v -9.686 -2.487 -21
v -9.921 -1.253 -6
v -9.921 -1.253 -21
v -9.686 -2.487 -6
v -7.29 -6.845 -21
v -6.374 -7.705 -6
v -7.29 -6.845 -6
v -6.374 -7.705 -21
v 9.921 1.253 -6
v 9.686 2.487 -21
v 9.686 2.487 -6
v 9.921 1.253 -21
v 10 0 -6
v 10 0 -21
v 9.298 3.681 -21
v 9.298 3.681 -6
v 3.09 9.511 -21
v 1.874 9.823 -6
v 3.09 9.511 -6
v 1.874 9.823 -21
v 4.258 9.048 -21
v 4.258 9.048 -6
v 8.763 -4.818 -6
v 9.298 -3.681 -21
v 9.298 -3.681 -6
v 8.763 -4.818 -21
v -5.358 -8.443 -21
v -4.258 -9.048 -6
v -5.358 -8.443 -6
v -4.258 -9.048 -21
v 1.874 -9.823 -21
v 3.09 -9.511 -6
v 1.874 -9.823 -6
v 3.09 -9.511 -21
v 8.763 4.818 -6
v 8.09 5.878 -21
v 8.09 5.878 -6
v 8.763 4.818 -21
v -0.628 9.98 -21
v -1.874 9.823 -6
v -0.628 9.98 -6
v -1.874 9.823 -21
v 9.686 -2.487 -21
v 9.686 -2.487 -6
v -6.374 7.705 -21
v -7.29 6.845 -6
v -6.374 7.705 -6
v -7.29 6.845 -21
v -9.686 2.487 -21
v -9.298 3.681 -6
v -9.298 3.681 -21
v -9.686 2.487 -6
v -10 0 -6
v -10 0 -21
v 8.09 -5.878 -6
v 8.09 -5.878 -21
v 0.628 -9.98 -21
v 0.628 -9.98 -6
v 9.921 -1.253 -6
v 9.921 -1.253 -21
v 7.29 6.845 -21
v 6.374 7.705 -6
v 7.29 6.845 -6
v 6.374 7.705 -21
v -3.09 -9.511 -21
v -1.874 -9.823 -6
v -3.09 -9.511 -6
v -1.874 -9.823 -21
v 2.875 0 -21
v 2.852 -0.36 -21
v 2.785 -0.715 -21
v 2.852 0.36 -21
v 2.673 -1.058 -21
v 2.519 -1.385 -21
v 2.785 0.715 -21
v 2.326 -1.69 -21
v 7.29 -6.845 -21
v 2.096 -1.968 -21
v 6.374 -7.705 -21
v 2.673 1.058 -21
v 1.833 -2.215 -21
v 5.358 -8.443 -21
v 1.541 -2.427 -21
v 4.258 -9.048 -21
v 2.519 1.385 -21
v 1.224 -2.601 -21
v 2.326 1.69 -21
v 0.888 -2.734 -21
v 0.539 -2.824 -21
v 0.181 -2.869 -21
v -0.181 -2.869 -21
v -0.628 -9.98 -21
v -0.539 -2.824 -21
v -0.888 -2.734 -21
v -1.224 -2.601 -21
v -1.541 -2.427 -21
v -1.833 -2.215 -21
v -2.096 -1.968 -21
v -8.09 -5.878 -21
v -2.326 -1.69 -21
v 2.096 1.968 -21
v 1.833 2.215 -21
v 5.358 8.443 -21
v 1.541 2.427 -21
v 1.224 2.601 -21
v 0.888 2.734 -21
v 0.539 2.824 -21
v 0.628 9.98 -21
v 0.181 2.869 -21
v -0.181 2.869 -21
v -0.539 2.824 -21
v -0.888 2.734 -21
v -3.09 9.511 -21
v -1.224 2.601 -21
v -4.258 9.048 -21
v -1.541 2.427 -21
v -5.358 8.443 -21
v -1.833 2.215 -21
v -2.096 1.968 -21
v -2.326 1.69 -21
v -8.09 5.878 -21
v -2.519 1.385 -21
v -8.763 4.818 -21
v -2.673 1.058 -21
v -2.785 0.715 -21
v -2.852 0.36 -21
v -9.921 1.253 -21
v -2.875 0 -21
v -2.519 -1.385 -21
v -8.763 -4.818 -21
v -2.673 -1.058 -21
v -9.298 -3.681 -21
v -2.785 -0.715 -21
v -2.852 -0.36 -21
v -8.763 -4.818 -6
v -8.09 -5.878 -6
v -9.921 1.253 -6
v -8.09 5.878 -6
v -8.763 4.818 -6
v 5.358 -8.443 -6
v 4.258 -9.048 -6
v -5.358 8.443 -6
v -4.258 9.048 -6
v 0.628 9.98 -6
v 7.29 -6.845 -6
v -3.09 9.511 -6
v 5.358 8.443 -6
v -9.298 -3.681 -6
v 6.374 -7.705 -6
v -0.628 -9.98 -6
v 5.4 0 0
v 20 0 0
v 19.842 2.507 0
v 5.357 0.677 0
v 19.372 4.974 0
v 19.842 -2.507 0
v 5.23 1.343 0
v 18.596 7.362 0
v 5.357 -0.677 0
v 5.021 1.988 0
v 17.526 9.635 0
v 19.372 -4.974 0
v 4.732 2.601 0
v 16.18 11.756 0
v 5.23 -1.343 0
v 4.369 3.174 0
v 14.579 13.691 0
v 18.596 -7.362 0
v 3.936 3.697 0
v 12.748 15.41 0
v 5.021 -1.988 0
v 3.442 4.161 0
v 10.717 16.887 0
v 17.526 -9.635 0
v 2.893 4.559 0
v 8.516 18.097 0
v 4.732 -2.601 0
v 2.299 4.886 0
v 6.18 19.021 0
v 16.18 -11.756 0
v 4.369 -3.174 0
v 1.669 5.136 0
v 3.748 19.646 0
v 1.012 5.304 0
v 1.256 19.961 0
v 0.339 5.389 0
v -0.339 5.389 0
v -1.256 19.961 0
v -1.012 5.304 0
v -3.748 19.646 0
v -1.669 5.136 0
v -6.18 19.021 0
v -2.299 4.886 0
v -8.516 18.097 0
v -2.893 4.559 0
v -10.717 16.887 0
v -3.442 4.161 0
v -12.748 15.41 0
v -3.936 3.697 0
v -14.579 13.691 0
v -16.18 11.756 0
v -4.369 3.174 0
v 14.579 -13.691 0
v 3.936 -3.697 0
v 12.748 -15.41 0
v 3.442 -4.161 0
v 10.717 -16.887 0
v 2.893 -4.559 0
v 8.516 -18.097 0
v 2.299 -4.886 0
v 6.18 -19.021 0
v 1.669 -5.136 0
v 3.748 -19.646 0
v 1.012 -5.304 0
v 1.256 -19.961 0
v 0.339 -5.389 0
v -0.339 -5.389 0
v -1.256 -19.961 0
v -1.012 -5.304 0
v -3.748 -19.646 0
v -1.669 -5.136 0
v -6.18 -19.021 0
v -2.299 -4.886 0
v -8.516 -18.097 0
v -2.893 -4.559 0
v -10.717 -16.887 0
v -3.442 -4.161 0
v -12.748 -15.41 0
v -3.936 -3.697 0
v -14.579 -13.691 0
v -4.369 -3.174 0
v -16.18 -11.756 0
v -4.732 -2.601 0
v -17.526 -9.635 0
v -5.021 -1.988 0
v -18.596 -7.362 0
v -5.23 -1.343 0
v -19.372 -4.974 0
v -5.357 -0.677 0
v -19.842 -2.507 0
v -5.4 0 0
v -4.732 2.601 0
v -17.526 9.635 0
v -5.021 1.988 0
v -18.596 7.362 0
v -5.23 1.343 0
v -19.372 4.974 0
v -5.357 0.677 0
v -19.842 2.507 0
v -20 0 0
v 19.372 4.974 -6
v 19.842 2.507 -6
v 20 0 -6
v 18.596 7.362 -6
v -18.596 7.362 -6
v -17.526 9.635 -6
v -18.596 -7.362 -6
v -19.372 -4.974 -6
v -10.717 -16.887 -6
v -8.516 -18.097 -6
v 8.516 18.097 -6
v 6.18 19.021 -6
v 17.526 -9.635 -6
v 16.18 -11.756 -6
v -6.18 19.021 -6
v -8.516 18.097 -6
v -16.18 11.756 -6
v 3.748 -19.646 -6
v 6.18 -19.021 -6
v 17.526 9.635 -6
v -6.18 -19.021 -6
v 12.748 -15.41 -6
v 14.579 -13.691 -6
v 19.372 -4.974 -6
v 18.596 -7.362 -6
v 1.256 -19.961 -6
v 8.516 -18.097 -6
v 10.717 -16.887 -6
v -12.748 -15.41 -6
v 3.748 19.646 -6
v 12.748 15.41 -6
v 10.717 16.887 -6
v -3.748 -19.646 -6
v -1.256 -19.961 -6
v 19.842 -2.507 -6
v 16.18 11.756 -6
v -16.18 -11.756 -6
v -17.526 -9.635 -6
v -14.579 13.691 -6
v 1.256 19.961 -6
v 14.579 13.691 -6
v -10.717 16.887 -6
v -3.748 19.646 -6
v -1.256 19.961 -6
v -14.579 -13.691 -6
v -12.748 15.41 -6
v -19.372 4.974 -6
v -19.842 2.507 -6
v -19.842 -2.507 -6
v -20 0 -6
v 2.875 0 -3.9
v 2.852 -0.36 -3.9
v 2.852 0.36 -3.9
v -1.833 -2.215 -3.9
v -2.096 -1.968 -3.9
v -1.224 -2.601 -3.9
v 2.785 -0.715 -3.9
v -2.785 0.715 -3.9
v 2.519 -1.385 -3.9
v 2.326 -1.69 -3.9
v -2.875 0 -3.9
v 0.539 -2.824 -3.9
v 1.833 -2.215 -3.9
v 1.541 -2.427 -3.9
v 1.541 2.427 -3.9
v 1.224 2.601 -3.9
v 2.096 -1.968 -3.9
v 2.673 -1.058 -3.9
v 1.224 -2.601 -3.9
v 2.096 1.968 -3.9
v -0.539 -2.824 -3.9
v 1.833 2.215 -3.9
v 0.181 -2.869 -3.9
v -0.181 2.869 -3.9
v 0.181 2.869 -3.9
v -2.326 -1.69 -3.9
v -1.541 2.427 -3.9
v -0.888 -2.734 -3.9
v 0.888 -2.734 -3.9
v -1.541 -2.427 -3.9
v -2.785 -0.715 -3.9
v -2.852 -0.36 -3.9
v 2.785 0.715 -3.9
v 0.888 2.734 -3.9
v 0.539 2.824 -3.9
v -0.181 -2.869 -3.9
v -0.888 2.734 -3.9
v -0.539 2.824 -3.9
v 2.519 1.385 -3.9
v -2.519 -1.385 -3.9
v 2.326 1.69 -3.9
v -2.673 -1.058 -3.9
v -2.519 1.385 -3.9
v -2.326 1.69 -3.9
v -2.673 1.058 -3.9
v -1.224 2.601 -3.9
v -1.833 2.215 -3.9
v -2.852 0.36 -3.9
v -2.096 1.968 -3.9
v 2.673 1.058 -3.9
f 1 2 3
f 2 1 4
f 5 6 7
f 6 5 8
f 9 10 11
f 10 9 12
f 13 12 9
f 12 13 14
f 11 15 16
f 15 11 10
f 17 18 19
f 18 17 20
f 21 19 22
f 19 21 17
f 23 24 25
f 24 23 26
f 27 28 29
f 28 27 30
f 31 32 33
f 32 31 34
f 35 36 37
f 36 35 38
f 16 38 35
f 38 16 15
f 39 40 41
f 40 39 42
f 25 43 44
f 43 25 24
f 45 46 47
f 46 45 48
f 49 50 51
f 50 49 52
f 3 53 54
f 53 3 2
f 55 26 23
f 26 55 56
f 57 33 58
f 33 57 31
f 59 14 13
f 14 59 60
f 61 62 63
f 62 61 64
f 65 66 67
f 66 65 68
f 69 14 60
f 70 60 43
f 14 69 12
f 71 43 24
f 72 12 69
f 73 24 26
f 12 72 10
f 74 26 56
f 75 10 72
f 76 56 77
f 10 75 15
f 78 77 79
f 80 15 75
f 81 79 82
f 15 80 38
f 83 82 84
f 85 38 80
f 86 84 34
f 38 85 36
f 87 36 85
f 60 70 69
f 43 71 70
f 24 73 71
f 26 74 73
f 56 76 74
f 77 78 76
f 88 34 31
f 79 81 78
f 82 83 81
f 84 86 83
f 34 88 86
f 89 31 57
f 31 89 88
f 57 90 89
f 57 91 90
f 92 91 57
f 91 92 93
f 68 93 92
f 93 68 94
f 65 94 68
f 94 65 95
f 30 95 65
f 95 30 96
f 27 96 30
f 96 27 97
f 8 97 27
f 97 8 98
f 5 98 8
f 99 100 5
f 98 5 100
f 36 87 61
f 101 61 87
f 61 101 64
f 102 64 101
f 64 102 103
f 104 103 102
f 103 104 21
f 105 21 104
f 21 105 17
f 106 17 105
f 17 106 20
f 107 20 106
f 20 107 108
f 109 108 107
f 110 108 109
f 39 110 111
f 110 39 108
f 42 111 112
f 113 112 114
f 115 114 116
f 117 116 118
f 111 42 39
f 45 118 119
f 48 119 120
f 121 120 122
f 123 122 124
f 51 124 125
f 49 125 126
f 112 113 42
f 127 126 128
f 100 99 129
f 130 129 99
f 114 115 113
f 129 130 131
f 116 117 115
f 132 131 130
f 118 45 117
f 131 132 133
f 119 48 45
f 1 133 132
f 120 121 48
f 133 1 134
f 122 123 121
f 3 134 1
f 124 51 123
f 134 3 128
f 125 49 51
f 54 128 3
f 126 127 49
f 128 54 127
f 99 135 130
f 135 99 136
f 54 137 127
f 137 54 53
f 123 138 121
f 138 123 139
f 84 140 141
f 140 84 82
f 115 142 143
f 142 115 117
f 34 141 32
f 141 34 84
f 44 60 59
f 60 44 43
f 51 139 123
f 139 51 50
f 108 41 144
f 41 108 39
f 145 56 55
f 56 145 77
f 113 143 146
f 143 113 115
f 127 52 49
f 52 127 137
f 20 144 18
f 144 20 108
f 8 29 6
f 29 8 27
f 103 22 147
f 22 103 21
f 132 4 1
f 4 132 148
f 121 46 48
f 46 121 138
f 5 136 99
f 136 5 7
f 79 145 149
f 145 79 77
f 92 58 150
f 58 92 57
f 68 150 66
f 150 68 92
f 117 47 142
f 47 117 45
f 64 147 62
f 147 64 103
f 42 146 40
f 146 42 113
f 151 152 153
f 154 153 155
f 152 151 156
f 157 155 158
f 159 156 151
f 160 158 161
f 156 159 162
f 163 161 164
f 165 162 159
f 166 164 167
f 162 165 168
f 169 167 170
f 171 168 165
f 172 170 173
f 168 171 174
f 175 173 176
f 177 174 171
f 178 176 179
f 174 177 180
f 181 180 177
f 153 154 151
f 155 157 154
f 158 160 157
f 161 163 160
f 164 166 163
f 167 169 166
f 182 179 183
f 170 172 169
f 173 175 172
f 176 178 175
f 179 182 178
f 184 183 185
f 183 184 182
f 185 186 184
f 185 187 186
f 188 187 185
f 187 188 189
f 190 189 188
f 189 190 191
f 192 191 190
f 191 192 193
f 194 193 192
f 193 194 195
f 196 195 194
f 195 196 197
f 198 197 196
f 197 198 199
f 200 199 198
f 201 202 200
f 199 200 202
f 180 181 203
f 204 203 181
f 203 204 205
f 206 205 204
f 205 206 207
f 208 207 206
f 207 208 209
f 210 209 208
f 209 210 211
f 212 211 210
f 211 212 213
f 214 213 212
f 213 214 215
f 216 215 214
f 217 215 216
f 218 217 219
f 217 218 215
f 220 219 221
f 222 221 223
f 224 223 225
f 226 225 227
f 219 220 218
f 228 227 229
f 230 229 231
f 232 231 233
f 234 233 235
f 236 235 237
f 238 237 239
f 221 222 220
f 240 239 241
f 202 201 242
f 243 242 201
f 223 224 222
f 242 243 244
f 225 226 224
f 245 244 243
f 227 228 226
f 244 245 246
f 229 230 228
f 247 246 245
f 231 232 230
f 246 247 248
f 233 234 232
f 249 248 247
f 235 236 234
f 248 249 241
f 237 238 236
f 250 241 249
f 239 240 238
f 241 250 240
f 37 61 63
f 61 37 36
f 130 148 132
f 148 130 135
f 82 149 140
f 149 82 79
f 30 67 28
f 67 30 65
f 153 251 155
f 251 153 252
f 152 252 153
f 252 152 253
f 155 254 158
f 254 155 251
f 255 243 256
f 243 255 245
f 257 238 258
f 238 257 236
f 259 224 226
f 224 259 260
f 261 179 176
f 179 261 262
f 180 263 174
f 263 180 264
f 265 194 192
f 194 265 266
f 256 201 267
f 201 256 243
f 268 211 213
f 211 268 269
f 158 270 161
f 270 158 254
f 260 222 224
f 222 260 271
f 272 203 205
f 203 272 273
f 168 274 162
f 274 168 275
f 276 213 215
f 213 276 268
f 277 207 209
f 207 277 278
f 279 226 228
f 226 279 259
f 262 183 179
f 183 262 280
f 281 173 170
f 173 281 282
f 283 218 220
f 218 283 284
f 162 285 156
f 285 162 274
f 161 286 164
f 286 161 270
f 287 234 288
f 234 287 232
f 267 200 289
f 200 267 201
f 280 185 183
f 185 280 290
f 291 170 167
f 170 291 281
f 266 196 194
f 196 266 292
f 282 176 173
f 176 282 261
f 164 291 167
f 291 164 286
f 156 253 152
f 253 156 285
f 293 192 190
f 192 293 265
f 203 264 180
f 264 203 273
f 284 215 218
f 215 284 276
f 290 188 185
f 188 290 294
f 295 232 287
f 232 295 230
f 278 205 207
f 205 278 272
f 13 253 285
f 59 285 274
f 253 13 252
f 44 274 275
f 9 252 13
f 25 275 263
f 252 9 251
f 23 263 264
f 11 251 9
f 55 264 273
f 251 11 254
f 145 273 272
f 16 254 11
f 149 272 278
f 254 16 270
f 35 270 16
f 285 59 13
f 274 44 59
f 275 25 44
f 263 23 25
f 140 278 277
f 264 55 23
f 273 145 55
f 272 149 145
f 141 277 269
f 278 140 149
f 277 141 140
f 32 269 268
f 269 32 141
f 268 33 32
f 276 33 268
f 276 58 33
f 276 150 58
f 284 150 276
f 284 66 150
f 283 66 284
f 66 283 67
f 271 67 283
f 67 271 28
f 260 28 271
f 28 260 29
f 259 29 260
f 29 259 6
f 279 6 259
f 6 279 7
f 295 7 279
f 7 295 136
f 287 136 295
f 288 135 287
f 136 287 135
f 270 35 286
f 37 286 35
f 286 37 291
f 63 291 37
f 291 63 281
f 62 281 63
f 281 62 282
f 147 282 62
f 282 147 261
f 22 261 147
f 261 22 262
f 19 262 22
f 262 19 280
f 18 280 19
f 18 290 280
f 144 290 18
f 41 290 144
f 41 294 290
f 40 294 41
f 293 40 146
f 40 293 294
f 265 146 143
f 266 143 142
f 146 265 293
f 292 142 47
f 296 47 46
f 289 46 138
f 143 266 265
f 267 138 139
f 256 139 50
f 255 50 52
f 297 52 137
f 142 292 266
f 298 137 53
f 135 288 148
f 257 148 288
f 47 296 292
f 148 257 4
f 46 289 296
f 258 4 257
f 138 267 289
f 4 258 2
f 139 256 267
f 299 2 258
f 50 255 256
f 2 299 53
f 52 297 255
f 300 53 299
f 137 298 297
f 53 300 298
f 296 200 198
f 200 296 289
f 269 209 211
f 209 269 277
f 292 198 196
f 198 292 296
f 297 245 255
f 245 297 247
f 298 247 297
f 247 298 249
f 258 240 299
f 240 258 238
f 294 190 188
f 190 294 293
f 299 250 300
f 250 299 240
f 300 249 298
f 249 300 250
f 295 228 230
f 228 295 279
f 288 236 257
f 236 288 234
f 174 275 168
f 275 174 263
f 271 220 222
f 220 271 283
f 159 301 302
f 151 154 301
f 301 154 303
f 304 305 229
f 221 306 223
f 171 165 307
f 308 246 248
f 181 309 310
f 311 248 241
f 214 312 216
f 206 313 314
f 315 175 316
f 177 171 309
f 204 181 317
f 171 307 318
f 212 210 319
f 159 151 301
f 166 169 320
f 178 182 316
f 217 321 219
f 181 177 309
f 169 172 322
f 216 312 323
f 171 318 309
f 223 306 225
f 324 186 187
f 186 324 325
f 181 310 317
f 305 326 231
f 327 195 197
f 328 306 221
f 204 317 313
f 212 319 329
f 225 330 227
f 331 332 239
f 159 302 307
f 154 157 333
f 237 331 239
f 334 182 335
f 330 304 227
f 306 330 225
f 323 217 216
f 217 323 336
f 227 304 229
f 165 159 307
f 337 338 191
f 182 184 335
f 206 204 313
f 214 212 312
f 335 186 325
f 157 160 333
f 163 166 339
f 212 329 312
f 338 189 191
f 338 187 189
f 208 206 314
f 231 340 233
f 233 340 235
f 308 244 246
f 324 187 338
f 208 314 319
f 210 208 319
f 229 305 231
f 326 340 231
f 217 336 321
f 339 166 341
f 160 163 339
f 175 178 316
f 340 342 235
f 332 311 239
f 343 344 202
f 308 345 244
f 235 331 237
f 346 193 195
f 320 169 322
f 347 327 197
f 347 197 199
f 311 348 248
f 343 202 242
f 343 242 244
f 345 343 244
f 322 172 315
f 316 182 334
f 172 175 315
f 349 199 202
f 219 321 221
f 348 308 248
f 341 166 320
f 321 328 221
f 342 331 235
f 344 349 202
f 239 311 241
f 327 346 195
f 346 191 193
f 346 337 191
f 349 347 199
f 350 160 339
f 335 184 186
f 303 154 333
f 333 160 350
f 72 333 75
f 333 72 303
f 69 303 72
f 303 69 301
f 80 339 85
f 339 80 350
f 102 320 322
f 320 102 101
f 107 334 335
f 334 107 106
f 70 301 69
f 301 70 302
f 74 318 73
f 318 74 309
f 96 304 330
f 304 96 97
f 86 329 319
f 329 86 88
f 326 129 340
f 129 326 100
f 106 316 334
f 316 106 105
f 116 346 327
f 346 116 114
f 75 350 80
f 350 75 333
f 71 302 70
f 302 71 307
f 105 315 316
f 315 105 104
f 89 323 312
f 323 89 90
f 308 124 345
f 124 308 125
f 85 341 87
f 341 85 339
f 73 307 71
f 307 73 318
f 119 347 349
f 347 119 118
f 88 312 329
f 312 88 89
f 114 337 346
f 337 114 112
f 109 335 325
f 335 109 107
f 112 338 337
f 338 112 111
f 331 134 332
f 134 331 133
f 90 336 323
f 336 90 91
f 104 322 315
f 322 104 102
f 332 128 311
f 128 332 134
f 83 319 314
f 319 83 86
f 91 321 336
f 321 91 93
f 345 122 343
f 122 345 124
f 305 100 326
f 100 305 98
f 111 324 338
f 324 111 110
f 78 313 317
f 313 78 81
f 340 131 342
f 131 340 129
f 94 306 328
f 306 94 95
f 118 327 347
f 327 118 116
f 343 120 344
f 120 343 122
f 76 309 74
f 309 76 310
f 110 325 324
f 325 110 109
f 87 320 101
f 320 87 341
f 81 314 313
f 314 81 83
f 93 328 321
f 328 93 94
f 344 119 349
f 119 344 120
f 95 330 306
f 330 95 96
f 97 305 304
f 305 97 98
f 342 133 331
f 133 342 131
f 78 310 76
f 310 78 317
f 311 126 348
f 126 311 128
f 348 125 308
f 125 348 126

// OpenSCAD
$fn = 50;


difference() {
	union() {
		translate(v = [0, 0, -21.0000000000]) {
			cylinder(h = 21, r = 10.0000000000);
		}
		translate(v = [0, 0, -6.0000000000]) {
			cylinder(h = 6, r = 20.0000000000);
		}
	}
	union() {
		translate(v = [0, 0, 0]) {
			rotate(a = [0, 0, 0]) {
				difference() {
					union() {
						#translate(v = [0, 0, -21.0000000000]) {
							cylinder(h = 21, r = 2.6000000000);
						}
						#translate(v = [0, 0, -3.9000000000]) {
							cylinder(h = 3.9000000000, r = 10.0000000000, r1 = 2.8750000000, r2 = 5.4000000000);
						}
						#translate(v = [0, 0, -21.0000000000]) {
							cylinder(h = 21, r = 2.8750000000);
						}
						#translate(v = [0, 0, -21.0000000000]) {
							cylinder(h = 21, r = 2.6000000000);
						}
					}
					union();
				}
			}
		}
	}
}
